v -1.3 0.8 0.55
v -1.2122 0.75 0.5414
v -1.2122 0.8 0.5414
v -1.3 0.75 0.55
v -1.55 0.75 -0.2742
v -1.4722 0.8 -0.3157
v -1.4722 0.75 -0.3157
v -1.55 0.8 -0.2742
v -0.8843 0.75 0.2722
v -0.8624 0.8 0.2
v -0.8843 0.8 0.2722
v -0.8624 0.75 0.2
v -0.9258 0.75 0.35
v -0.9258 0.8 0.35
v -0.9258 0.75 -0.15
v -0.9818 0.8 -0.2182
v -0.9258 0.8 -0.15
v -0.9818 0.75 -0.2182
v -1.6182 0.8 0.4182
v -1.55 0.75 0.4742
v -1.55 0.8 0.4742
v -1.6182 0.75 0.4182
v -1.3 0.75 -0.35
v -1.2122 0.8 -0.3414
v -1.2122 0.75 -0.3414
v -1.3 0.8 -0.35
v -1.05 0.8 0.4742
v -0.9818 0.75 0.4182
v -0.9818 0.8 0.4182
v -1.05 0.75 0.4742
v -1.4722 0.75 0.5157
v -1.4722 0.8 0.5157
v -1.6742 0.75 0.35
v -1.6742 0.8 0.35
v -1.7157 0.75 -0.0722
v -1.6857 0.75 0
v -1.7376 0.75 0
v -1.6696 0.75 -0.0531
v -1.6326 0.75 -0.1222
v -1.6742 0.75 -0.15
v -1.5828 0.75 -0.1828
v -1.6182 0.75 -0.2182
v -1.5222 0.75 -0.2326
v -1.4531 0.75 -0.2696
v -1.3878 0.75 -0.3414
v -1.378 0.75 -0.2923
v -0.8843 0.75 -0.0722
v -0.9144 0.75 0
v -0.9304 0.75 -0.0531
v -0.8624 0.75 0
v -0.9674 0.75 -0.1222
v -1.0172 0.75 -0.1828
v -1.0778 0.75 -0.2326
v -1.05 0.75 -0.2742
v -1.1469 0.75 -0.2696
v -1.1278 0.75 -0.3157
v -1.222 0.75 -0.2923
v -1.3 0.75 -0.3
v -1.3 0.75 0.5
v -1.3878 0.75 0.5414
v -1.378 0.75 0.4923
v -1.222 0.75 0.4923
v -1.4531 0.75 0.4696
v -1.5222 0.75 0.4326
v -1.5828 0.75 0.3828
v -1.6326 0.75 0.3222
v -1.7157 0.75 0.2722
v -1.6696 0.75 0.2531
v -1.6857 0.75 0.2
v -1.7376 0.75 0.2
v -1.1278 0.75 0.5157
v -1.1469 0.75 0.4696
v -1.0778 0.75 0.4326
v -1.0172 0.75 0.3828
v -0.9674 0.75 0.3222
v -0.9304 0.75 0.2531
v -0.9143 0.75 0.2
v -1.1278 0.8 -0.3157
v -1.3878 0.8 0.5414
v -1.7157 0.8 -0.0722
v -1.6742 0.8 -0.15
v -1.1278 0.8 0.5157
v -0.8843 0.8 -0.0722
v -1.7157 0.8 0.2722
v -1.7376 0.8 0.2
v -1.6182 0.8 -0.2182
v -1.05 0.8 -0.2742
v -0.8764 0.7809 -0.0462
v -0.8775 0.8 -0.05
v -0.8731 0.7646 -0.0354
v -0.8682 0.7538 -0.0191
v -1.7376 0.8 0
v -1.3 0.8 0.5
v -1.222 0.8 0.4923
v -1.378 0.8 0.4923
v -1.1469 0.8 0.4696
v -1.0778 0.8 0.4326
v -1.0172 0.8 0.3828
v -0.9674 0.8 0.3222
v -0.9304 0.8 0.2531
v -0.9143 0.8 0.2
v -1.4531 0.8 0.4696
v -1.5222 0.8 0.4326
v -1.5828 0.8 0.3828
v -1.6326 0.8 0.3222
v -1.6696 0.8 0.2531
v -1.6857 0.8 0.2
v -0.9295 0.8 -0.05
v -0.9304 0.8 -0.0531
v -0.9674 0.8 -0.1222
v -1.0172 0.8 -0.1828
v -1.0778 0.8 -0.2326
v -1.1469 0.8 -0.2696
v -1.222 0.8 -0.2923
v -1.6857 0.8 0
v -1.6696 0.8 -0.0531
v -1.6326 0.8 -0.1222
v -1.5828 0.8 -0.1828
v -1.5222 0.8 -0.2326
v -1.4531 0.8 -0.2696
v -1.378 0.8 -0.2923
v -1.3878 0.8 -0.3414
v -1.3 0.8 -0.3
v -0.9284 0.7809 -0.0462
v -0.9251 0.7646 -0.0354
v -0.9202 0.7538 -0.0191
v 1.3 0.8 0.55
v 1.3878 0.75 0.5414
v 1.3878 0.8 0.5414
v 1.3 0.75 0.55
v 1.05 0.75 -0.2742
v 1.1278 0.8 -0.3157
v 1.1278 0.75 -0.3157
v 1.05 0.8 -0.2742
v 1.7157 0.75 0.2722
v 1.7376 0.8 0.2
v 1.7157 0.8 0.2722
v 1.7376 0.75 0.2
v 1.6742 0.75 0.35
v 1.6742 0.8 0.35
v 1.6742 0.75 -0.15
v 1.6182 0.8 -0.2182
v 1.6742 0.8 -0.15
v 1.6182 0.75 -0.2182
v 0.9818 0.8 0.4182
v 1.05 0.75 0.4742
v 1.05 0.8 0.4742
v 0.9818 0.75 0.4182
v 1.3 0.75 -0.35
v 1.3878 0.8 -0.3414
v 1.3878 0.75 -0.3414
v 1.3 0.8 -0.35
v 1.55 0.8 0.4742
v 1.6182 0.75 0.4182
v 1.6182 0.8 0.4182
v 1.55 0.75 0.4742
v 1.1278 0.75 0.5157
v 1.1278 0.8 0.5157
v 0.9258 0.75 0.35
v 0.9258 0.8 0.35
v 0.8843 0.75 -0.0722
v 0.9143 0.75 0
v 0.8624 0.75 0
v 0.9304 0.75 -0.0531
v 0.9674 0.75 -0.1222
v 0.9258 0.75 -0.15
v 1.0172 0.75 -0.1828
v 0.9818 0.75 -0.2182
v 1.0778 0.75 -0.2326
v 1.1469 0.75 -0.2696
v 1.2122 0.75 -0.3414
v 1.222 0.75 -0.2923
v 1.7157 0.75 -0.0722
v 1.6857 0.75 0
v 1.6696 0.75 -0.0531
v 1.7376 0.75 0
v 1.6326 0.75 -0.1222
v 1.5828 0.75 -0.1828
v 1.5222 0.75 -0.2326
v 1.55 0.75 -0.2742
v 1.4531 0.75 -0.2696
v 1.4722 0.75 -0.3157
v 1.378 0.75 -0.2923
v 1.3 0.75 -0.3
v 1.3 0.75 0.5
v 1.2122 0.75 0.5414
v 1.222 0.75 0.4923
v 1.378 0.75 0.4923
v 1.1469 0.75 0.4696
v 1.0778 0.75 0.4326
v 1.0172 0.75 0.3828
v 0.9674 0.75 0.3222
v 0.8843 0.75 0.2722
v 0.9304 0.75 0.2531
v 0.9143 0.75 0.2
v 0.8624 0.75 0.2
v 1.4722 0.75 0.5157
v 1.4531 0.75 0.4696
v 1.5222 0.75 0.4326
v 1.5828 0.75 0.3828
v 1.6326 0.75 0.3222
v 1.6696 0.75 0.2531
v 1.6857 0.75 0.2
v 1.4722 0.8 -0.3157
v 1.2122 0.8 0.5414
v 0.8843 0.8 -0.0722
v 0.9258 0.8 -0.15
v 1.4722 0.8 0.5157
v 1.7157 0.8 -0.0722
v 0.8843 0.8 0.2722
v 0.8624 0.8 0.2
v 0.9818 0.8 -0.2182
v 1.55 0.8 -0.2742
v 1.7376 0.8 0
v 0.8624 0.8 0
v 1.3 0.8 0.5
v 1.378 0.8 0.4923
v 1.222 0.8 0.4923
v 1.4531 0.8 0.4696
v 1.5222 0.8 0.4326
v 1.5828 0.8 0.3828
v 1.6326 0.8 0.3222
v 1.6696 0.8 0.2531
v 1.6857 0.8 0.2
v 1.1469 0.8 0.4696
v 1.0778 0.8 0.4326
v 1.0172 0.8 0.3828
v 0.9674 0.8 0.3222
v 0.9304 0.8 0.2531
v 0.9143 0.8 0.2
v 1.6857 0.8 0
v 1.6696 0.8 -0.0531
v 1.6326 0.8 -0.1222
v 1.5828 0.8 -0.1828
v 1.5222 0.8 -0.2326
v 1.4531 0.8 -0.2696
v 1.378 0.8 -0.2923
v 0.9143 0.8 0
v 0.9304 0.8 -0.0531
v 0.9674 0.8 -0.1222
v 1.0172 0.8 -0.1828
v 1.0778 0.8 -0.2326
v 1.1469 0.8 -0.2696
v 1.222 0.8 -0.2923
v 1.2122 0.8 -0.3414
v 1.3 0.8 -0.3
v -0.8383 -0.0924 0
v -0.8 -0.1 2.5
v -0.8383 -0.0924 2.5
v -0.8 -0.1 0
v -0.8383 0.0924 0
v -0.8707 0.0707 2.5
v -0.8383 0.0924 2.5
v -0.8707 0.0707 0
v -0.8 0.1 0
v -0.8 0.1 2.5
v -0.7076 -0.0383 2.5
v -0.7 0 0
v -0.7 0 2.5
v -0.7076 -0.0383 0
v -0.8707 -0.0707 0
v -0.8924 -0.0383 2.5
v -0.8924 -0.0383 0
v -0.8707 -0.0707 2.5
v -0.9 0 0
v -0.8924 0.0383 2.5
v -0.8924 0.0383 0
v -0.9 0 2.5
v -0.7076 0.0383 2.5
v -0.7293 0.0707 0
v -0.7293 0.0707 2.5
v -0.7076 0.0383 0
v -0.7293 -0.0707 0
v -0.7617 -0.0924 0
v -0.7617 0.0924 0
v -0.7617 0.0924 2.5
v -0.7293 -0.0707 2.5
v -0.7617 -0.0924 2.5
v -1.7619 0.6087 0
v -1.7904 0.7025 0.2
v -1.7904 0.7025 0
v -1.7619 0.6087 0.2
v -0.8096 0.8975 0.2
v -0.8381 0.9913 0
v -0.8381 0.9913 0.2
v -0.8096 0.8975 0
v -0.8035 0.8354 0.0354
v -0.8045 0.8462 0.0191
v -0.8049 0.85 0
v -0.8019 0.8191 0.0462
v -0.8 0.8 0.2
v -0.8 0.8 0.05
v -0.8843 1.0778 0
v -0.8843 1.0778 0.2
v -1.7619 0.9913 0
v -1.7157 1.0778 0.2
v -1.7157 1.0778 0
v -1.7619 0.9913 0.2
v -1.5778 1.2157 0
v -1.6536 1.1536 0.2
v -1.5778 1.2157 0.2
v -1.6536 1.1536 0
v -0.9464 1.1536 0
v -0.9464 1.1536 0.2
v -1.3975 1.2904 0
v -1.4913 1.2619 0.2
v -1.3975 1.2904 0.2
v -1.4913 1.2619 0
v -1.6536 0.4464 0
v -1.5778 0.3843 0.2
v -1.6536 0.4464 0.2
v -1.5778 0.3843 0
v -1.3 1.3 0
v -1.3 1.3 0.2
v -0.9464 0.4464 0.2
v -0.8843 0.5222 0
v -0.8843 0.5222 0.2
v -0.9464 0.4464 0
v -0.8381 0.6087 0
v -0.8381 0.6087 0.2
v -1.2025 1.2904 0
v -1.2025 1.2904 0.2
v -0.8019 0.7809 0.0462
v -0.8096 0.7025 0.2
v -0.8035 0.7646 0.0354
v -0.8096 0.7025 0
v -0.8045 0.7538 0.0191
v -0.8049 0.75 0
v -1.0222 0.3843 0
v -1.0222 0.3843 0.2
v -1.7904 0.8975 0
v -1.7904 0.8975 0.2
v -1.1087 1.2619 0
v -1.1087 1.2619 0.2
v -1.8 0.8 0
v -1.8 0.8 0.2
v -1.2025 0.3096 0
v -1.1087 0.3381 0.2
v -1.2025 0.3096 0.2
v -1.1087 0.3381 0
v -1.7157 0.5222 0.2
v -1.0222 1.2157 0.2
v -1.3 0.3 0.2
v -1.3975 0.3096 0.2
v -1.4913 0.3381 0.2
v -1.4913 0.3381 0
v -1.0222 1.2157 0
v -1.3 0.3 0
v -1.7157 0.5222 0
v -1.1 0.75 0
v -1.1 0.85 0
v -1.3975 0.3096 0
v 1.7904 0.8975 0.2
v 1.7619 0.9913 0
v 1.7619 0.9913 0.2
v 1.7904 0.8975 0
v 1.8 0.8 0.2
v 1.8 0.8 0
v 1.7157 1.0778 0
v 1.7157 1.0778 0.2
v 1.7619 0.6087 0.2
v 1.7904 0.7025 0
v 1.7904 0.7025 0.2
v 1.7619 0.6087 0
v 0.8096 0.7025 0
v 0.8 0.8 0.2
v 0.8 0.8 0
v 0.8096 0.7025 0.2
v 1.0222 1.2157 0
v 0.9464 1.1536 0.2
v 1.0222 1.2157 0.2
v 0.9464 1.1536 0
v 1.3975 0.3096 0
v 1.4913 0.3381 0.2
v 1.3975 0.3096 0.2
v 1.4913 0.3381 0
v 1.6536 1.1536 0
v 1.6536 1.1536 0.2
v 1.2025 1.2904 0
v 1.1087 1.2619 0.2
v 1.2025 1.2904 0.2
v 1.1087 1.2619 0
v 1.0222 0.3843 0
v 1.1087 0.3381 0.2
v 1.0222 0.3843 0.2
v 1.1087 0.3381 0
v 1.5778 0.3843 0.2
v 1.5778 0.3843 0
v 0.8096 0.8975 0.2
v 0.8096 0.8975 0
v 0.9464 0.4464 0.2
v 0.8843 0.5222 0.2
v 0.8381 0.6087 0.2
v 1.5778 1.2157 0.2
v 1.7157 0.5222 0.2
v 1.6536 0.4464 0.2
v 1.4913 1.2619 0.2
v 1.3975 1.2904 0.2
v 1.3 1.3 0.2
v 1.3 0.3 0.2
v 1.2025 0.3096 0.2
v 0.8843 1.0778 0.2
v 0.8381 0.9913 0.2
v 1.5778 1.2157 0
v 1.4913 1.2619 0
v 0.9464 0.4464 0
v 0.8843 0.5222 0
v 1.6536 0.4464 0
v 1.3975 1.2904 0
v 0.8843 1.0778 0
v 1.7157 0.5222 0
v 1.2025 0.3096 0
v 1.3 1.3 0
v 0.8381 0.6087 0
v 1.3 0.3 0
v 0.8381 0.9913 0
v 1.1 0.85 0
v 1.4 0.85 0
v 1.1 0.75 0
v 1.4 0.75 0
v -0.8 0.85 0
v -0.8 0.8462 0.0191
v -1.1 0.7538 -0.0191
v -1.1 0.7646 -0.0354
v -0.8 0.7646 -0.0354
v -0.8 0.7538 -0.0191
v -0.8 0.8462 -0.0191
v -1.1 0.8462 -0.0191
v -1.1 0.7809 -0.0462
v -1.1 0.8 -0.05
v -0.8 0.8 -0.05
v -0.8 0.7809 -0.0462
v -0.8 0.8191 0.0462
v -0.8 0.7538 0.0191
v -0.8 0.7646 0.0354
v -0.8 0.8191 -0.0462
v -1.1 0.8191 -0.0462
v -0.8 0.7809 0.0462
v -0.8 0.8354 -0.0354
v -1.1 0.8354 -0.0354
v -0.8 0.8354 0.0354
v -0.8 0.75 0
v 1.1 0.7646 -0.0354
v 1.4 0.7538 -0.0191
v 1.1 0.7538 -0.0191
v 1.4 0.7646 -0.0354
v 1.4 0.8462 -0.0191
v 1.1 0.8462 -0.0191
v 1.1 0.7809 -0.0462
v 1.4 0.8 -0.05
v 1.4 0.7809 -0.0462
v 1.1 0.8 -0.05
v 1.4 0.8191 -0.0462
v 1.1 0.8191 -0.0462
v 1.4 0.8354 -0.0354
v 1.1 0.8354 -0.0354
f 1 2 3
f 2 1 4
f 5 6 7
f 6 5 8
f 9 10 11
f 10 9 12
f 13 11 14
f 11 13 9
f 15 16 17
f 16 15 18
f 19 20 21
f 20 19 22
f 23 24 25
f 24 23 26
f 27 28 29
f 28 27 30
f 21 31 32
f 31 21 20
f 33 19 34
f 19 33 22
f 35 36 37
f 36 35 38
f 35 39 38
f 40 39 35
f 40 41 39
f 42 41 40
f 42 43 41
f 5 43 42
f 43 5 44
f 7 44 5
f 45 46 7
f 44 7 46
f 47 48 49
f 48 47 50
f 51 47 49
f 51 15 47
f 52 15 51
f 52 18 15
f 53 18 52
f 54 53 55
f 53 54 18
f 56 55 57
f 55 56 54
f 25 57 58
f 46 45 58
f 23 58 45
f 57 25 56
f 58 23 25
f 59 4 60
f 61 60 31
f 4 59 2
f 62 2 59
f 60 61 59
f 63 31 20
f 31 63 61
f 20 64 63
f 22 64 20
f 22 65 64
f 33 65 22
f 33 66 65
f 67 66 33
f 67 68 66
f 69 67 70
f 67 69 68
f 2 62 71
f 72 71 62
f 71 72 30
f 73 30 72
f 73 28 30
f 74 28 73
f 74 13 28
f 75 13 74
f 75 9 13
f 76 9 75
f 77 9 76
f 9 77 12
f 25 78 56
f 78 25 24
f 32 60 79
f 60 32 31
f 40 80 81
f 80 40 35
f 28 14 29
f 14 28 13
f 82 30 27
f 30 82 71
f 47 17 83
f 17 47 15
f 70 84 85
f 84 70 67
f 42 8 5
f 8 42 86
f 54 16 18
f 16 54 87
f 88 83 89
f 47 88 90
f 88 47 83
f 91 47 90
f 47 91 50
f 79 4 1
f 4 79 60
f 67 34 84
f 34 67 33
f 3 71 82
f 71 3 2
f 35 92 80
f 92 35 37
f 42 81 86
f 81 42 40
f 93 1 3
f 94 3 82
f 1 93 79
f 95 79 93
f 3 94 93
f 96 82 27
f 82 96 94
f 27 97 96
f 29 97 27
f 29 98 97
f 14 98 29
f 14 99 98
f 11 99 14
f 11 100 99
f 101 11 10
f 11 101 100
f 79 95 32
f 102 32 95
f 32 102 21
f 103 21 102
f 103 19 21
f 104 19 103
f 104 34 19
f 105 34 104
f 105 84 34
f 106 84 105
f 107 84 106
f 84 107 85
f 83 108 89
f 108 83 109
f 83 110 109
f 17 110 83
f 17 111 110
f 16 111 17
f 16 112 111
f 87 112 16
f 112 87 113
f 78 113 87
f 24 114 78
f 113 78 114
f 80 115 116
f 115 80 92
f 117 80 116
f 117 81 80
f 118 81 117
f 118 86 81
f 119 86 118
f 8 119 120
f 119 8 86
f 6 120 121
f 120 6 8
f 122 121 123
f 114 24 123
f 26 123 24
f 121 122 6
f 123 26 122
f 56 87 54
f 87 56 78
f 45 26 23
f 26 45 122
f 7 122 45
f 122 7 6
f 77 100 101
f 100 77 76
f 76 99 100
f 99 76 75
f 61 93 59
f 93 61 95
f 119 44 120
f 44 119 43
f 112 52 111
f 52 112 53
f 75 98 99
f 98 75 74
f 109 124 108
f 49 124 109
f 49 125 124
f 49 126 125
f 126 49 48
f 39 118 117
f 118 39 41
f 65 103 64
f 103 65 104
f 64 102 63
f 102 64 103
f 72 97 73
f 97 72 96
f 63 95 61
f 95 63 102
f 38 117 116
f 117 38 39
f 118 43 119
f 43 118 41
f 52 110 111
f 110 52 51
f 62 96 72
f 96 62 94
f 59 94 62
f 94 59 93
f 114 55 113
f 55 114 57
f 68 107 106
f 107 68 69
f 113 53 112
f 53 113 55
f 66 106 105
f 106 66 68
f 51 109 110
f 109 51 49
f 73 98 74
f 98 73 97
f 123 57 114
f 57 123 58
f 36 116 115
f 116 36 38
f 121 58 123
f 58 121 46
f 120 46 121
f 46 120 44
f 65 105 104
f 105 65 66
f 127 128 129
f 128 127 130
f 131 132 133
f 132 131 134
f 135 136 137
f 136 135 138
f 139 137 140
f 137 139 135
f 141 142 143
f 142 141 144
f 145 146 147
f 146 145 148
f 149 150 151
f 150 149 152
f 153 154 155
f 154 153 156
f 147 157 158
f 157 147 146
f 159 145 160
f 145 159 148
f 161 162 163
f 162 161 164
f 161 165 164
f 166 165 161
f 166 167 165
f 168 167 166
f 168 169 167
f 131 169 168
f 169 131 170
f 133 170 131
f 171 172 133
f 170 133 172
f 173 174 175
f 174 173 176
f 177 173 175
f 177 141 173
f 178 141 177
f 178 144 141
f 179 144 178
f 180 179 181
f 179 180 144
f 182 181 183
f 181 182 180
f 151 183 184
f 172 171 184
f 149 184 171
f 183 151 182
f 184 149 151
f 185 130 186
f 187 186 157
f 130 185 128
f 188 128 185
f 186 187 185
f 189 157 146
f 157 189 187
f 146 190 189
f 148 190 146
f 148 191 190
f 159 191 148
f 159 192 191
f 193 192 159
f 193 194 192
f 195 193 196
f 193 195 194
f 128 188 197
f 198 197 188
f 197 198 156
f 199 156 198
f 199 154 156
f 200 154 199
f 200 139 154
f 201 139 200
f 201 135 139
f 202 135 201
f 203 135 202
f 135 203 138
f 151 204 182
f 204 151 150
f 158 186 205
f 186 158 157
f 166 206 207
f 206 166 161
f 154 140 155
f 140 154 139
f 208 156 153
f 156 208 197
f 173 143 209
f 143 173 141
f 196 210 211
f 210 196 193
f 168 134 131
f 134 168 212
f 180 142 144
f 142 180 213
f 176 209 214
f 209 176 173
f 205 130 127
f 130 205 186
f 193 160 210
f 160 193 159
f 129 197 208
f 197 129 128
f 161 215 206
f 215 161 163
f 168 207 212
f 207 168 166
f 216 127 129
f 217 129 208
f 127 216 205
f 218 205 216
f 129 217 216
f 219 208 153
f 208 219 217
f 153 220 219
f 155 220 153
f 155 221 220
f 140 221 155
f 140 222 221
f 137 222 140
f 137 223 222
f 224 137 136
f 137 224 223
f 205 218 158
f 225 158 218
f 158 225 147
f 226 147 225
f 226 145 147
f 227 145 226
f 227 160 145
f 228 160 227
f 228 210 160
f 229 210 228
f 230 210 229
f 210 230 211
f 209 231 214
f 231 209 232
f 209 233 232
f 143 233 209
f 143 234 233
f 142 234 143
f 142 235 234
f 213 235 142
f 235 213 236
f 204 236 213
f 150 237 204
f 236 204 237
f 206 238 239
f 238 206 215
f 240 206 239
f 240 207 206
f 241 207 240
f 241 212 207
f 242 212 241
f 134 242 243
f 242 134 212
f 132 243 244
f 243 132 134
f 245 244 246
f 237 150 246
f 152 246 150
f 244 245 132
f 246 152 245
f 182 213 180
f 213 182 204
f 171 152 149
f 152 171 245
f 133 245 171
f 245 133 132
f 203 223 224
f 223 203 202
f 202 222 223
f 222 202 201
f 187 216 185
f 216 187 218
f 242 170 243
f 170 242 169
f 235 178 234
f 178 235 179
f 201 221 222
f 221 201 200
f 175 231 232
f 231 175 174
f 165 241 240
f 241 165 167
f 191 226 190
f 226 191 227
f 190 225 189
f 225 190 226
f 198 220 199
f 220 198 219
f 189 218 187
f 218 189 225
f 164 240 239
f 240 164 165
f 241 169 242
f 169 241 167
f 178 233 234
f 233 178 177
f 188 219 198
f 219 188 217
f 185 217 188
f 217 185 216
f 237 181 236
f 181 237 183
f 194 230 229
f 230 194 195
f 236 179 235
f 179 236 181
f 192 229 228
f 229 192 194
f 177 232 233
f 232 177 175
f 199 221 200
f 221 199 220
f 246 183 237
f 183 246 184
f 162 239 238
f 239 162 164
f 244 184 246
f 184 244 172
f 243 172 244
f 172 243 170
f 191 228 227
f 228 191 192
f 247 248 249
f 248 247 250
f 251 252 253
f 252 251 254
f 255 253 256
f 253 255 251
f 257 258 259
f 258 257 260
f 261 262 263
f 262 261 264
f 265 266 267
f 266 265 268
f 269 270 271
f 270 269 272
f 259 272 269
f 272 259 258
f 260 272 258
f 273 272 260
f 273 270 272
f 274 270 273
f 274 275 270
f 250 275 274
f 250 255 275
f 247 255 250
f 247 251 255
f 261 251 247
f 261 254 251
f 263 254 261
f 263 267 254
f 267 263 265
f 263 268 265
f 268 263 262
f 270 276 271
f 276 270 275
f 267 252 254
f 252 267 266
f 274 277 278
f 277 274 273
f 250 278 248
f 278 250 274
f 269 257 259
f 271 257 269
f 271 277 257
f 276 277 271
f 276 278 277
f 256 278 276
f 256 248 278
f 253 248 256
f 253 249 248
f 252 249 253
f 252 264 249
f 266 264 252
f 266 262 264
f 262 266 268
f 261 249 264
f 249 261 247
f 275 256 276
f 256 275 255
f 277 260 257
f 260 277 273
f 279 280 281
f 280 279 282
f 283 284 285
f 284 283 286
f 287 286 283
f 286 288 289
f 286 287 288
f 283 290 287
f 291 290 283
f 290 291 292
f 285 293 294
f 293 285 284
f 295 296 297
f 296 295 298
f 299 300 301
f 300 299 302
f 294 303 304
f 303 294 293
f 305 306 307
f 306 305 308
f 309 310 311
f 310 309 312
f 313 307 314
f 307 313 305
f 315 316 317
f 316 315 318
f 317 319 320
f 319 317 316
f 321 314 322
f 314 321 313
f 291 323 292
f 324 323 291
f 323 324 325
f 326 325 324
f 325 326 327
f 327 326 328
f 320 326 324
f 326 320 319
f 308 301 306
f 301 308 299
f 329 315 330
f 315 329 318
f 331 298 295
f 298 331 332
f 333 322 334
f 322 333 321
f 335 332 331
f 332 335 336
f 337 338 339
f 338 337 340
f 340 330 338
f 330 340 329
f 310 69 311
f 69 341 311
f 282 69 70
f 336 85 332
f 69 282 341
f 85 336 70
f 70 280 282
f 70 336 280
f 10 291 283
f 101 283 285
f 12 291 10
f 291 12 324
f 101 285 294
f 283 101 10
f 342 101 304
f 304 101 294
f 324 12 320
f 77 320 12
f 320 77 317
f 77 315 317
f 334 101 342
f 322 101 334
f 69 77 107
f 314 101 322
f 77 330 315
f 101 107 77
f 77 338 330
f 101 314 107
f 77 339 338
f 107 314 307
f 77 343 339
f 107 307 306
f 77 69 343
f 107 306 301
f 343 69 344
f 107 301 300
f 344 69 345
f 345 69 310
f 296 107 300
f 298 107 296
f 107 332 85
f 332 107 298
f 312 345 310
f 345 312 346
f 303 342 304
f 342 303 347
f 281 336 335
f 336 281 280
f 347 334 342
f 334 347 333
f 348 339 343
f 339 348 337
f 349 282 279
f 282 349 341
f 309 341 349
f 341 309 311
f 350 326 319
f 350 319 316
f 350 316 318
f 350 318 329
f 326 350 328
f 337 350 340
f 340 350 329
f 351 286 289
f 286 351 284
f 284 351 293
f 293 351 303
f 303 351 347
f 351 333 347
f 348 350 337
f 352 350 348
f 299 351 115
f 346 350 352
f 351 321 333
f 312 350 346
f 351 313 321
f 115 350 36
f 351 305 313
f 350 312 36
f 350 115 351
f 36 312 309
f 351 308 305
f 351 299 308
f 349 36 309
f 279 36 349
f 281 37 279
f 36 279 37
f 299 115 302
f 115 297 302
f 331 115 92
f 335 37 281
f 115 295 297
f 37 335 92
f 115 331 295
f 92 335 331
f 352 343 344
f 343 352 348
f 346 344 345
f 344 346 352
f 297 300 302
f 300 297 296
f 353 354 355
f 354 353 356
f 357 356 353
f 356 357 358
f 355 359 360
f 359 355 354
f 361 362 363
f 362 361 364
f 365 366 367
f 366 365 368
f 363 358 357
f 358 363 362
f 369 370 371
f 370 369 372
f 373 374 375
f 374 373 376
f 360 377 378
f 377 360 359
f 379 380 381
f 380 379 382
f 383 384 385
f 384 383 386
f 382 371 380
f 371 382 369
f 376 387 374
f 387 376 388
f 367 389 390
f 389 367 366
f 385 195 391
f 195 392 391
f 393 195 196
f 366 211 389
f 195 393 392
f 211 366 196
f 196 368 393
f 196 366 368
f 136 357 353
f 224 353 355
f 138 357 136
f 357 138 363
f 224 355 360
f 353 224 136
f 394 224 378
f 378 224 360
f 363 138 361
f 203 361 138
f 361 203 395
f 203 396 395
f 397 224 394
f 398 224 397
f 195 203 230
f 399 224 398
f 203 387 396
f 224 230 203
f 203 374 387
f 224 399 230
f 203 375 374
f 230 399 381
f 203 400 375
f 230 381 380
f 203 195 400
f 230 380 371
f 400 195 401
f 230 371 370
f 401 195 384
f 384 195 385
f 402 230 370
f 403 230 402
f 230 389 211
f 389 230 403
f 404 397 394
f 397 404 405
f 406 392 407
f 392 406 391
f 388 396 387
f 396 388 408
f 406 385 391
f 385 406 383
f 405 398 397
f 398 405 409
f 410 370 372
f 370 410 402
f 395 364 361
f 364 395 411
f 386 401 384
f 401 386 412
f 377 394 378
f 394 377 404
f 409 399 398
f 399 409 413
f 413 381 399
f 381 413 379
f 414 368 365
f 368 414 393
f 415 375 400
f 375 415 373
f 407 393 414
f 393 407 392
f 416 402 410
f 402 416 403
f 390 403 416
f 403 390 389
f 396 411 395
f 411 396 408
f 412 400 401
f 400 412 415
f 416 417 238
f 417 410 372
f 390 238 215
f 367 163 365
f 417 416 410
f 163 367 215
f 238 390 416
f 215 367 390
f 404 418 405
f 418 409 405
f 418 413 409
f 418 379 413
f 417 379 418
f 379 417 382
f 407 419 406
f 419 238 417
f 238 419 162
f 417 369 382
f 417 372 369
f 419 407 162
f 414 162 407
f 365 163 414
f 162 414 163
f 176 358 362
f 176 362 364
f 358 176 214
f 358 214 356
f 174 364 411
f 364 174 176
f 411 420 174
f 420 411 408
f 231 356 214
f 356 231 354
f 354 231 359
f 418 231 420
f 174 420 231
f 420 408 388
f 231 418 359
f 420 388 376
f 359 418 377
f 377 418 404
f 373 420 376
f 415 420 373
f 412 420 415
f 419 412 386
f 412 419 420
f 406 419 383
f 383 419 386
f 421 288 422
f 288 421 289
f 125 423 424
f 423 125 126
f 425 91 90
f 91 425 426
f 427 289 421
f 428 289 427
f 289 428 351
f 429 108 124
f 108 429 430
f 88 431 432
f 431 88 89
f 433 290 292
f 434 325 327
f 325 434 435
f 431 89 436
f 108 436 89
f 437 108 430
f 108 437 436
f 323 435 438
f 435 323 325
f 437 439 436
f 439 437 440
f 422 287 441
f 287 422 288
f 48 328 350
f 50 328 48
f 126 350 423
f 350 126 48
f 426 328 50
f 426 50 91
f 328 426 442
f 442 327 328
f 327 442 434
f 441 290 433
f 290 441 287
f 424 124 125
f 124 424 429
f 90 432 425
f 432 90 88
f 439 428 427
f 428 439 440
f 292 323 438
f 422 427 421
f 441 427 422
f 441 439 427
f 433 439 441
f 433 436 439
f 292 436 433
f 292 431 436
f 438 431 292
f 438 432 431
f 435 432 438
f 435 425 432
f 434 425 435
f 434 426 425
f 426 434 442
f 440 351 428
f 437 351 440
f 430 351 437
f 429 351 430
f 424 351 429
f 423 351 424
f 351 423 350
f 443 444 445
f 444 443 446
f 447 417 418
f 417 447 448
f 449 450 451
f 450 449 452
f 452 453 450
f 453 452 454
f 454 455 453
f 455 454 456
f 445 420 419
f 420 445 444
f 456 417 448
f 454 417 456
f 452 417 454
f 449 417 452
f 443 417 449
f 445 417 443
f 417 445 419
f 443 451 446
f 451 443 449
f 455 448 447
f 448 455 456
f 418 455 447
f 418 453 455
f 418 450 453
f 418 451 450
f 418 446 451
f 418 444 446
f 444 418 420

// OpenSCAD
// Headphones model

// Headband (curved cylinder)
color([0.133, 0.133, 0.133]) // #222222
rotate([0, 0, 90])
translate([0, 0.8, 0])
cylinder(h=2.5, r=0.1, $fn=16);

// Left ear cup
color([0.2, 0.2, 0.2]) // #333333
translate([-1.3, 0.8, 0])
cylinder(h=0.2, r=0.5, $fn=32);

// Right ear cup
color([0.2, 0.2, 0.2]) // #333333
translate([1.3, 0.8, 0])
cylinder(h=0.2, r=0.5, $fn=32);

// Left ear cushion (approximated with torus using difference of cylinders)
color([0.067, 0.067, 0.067]) // #111111
translate([-1.3, 0.8, 0.1])
rotate([90, 0, 0])
difference() {
    cylinder(h=0.05, r=0.45, $fn=32);
    cylinder(h=0.05, r=0.4, $fn=32);
}

// Right ear cushion (approximated with torus using difference of cylinders)
color([0.067, 0.067, 0.067]) // #111111
translate([1.3, 0.8, 0.1])
rotate([90, 0, 0])
difference() {
    cylinder(h=0.05, r=0.45, $fn=32);
    cylinder(h=0.05, r=0.4, $fn=32);
}

// Left connector
color([0.133, 0.133, 0.133]) // #222222
translate([-1.1, 0.8, 0])
rotate([0, 90, 0])
cylinder(h=0.3, r=0.05, $fn=16);

// Right connector
color([0.133, 0.133, 0.133]) // #222222
translate([1.1, 0.8, 0])
rotate([0, 90, 0])
cylinder(h=0.3, r=0.05, $fn=16);
